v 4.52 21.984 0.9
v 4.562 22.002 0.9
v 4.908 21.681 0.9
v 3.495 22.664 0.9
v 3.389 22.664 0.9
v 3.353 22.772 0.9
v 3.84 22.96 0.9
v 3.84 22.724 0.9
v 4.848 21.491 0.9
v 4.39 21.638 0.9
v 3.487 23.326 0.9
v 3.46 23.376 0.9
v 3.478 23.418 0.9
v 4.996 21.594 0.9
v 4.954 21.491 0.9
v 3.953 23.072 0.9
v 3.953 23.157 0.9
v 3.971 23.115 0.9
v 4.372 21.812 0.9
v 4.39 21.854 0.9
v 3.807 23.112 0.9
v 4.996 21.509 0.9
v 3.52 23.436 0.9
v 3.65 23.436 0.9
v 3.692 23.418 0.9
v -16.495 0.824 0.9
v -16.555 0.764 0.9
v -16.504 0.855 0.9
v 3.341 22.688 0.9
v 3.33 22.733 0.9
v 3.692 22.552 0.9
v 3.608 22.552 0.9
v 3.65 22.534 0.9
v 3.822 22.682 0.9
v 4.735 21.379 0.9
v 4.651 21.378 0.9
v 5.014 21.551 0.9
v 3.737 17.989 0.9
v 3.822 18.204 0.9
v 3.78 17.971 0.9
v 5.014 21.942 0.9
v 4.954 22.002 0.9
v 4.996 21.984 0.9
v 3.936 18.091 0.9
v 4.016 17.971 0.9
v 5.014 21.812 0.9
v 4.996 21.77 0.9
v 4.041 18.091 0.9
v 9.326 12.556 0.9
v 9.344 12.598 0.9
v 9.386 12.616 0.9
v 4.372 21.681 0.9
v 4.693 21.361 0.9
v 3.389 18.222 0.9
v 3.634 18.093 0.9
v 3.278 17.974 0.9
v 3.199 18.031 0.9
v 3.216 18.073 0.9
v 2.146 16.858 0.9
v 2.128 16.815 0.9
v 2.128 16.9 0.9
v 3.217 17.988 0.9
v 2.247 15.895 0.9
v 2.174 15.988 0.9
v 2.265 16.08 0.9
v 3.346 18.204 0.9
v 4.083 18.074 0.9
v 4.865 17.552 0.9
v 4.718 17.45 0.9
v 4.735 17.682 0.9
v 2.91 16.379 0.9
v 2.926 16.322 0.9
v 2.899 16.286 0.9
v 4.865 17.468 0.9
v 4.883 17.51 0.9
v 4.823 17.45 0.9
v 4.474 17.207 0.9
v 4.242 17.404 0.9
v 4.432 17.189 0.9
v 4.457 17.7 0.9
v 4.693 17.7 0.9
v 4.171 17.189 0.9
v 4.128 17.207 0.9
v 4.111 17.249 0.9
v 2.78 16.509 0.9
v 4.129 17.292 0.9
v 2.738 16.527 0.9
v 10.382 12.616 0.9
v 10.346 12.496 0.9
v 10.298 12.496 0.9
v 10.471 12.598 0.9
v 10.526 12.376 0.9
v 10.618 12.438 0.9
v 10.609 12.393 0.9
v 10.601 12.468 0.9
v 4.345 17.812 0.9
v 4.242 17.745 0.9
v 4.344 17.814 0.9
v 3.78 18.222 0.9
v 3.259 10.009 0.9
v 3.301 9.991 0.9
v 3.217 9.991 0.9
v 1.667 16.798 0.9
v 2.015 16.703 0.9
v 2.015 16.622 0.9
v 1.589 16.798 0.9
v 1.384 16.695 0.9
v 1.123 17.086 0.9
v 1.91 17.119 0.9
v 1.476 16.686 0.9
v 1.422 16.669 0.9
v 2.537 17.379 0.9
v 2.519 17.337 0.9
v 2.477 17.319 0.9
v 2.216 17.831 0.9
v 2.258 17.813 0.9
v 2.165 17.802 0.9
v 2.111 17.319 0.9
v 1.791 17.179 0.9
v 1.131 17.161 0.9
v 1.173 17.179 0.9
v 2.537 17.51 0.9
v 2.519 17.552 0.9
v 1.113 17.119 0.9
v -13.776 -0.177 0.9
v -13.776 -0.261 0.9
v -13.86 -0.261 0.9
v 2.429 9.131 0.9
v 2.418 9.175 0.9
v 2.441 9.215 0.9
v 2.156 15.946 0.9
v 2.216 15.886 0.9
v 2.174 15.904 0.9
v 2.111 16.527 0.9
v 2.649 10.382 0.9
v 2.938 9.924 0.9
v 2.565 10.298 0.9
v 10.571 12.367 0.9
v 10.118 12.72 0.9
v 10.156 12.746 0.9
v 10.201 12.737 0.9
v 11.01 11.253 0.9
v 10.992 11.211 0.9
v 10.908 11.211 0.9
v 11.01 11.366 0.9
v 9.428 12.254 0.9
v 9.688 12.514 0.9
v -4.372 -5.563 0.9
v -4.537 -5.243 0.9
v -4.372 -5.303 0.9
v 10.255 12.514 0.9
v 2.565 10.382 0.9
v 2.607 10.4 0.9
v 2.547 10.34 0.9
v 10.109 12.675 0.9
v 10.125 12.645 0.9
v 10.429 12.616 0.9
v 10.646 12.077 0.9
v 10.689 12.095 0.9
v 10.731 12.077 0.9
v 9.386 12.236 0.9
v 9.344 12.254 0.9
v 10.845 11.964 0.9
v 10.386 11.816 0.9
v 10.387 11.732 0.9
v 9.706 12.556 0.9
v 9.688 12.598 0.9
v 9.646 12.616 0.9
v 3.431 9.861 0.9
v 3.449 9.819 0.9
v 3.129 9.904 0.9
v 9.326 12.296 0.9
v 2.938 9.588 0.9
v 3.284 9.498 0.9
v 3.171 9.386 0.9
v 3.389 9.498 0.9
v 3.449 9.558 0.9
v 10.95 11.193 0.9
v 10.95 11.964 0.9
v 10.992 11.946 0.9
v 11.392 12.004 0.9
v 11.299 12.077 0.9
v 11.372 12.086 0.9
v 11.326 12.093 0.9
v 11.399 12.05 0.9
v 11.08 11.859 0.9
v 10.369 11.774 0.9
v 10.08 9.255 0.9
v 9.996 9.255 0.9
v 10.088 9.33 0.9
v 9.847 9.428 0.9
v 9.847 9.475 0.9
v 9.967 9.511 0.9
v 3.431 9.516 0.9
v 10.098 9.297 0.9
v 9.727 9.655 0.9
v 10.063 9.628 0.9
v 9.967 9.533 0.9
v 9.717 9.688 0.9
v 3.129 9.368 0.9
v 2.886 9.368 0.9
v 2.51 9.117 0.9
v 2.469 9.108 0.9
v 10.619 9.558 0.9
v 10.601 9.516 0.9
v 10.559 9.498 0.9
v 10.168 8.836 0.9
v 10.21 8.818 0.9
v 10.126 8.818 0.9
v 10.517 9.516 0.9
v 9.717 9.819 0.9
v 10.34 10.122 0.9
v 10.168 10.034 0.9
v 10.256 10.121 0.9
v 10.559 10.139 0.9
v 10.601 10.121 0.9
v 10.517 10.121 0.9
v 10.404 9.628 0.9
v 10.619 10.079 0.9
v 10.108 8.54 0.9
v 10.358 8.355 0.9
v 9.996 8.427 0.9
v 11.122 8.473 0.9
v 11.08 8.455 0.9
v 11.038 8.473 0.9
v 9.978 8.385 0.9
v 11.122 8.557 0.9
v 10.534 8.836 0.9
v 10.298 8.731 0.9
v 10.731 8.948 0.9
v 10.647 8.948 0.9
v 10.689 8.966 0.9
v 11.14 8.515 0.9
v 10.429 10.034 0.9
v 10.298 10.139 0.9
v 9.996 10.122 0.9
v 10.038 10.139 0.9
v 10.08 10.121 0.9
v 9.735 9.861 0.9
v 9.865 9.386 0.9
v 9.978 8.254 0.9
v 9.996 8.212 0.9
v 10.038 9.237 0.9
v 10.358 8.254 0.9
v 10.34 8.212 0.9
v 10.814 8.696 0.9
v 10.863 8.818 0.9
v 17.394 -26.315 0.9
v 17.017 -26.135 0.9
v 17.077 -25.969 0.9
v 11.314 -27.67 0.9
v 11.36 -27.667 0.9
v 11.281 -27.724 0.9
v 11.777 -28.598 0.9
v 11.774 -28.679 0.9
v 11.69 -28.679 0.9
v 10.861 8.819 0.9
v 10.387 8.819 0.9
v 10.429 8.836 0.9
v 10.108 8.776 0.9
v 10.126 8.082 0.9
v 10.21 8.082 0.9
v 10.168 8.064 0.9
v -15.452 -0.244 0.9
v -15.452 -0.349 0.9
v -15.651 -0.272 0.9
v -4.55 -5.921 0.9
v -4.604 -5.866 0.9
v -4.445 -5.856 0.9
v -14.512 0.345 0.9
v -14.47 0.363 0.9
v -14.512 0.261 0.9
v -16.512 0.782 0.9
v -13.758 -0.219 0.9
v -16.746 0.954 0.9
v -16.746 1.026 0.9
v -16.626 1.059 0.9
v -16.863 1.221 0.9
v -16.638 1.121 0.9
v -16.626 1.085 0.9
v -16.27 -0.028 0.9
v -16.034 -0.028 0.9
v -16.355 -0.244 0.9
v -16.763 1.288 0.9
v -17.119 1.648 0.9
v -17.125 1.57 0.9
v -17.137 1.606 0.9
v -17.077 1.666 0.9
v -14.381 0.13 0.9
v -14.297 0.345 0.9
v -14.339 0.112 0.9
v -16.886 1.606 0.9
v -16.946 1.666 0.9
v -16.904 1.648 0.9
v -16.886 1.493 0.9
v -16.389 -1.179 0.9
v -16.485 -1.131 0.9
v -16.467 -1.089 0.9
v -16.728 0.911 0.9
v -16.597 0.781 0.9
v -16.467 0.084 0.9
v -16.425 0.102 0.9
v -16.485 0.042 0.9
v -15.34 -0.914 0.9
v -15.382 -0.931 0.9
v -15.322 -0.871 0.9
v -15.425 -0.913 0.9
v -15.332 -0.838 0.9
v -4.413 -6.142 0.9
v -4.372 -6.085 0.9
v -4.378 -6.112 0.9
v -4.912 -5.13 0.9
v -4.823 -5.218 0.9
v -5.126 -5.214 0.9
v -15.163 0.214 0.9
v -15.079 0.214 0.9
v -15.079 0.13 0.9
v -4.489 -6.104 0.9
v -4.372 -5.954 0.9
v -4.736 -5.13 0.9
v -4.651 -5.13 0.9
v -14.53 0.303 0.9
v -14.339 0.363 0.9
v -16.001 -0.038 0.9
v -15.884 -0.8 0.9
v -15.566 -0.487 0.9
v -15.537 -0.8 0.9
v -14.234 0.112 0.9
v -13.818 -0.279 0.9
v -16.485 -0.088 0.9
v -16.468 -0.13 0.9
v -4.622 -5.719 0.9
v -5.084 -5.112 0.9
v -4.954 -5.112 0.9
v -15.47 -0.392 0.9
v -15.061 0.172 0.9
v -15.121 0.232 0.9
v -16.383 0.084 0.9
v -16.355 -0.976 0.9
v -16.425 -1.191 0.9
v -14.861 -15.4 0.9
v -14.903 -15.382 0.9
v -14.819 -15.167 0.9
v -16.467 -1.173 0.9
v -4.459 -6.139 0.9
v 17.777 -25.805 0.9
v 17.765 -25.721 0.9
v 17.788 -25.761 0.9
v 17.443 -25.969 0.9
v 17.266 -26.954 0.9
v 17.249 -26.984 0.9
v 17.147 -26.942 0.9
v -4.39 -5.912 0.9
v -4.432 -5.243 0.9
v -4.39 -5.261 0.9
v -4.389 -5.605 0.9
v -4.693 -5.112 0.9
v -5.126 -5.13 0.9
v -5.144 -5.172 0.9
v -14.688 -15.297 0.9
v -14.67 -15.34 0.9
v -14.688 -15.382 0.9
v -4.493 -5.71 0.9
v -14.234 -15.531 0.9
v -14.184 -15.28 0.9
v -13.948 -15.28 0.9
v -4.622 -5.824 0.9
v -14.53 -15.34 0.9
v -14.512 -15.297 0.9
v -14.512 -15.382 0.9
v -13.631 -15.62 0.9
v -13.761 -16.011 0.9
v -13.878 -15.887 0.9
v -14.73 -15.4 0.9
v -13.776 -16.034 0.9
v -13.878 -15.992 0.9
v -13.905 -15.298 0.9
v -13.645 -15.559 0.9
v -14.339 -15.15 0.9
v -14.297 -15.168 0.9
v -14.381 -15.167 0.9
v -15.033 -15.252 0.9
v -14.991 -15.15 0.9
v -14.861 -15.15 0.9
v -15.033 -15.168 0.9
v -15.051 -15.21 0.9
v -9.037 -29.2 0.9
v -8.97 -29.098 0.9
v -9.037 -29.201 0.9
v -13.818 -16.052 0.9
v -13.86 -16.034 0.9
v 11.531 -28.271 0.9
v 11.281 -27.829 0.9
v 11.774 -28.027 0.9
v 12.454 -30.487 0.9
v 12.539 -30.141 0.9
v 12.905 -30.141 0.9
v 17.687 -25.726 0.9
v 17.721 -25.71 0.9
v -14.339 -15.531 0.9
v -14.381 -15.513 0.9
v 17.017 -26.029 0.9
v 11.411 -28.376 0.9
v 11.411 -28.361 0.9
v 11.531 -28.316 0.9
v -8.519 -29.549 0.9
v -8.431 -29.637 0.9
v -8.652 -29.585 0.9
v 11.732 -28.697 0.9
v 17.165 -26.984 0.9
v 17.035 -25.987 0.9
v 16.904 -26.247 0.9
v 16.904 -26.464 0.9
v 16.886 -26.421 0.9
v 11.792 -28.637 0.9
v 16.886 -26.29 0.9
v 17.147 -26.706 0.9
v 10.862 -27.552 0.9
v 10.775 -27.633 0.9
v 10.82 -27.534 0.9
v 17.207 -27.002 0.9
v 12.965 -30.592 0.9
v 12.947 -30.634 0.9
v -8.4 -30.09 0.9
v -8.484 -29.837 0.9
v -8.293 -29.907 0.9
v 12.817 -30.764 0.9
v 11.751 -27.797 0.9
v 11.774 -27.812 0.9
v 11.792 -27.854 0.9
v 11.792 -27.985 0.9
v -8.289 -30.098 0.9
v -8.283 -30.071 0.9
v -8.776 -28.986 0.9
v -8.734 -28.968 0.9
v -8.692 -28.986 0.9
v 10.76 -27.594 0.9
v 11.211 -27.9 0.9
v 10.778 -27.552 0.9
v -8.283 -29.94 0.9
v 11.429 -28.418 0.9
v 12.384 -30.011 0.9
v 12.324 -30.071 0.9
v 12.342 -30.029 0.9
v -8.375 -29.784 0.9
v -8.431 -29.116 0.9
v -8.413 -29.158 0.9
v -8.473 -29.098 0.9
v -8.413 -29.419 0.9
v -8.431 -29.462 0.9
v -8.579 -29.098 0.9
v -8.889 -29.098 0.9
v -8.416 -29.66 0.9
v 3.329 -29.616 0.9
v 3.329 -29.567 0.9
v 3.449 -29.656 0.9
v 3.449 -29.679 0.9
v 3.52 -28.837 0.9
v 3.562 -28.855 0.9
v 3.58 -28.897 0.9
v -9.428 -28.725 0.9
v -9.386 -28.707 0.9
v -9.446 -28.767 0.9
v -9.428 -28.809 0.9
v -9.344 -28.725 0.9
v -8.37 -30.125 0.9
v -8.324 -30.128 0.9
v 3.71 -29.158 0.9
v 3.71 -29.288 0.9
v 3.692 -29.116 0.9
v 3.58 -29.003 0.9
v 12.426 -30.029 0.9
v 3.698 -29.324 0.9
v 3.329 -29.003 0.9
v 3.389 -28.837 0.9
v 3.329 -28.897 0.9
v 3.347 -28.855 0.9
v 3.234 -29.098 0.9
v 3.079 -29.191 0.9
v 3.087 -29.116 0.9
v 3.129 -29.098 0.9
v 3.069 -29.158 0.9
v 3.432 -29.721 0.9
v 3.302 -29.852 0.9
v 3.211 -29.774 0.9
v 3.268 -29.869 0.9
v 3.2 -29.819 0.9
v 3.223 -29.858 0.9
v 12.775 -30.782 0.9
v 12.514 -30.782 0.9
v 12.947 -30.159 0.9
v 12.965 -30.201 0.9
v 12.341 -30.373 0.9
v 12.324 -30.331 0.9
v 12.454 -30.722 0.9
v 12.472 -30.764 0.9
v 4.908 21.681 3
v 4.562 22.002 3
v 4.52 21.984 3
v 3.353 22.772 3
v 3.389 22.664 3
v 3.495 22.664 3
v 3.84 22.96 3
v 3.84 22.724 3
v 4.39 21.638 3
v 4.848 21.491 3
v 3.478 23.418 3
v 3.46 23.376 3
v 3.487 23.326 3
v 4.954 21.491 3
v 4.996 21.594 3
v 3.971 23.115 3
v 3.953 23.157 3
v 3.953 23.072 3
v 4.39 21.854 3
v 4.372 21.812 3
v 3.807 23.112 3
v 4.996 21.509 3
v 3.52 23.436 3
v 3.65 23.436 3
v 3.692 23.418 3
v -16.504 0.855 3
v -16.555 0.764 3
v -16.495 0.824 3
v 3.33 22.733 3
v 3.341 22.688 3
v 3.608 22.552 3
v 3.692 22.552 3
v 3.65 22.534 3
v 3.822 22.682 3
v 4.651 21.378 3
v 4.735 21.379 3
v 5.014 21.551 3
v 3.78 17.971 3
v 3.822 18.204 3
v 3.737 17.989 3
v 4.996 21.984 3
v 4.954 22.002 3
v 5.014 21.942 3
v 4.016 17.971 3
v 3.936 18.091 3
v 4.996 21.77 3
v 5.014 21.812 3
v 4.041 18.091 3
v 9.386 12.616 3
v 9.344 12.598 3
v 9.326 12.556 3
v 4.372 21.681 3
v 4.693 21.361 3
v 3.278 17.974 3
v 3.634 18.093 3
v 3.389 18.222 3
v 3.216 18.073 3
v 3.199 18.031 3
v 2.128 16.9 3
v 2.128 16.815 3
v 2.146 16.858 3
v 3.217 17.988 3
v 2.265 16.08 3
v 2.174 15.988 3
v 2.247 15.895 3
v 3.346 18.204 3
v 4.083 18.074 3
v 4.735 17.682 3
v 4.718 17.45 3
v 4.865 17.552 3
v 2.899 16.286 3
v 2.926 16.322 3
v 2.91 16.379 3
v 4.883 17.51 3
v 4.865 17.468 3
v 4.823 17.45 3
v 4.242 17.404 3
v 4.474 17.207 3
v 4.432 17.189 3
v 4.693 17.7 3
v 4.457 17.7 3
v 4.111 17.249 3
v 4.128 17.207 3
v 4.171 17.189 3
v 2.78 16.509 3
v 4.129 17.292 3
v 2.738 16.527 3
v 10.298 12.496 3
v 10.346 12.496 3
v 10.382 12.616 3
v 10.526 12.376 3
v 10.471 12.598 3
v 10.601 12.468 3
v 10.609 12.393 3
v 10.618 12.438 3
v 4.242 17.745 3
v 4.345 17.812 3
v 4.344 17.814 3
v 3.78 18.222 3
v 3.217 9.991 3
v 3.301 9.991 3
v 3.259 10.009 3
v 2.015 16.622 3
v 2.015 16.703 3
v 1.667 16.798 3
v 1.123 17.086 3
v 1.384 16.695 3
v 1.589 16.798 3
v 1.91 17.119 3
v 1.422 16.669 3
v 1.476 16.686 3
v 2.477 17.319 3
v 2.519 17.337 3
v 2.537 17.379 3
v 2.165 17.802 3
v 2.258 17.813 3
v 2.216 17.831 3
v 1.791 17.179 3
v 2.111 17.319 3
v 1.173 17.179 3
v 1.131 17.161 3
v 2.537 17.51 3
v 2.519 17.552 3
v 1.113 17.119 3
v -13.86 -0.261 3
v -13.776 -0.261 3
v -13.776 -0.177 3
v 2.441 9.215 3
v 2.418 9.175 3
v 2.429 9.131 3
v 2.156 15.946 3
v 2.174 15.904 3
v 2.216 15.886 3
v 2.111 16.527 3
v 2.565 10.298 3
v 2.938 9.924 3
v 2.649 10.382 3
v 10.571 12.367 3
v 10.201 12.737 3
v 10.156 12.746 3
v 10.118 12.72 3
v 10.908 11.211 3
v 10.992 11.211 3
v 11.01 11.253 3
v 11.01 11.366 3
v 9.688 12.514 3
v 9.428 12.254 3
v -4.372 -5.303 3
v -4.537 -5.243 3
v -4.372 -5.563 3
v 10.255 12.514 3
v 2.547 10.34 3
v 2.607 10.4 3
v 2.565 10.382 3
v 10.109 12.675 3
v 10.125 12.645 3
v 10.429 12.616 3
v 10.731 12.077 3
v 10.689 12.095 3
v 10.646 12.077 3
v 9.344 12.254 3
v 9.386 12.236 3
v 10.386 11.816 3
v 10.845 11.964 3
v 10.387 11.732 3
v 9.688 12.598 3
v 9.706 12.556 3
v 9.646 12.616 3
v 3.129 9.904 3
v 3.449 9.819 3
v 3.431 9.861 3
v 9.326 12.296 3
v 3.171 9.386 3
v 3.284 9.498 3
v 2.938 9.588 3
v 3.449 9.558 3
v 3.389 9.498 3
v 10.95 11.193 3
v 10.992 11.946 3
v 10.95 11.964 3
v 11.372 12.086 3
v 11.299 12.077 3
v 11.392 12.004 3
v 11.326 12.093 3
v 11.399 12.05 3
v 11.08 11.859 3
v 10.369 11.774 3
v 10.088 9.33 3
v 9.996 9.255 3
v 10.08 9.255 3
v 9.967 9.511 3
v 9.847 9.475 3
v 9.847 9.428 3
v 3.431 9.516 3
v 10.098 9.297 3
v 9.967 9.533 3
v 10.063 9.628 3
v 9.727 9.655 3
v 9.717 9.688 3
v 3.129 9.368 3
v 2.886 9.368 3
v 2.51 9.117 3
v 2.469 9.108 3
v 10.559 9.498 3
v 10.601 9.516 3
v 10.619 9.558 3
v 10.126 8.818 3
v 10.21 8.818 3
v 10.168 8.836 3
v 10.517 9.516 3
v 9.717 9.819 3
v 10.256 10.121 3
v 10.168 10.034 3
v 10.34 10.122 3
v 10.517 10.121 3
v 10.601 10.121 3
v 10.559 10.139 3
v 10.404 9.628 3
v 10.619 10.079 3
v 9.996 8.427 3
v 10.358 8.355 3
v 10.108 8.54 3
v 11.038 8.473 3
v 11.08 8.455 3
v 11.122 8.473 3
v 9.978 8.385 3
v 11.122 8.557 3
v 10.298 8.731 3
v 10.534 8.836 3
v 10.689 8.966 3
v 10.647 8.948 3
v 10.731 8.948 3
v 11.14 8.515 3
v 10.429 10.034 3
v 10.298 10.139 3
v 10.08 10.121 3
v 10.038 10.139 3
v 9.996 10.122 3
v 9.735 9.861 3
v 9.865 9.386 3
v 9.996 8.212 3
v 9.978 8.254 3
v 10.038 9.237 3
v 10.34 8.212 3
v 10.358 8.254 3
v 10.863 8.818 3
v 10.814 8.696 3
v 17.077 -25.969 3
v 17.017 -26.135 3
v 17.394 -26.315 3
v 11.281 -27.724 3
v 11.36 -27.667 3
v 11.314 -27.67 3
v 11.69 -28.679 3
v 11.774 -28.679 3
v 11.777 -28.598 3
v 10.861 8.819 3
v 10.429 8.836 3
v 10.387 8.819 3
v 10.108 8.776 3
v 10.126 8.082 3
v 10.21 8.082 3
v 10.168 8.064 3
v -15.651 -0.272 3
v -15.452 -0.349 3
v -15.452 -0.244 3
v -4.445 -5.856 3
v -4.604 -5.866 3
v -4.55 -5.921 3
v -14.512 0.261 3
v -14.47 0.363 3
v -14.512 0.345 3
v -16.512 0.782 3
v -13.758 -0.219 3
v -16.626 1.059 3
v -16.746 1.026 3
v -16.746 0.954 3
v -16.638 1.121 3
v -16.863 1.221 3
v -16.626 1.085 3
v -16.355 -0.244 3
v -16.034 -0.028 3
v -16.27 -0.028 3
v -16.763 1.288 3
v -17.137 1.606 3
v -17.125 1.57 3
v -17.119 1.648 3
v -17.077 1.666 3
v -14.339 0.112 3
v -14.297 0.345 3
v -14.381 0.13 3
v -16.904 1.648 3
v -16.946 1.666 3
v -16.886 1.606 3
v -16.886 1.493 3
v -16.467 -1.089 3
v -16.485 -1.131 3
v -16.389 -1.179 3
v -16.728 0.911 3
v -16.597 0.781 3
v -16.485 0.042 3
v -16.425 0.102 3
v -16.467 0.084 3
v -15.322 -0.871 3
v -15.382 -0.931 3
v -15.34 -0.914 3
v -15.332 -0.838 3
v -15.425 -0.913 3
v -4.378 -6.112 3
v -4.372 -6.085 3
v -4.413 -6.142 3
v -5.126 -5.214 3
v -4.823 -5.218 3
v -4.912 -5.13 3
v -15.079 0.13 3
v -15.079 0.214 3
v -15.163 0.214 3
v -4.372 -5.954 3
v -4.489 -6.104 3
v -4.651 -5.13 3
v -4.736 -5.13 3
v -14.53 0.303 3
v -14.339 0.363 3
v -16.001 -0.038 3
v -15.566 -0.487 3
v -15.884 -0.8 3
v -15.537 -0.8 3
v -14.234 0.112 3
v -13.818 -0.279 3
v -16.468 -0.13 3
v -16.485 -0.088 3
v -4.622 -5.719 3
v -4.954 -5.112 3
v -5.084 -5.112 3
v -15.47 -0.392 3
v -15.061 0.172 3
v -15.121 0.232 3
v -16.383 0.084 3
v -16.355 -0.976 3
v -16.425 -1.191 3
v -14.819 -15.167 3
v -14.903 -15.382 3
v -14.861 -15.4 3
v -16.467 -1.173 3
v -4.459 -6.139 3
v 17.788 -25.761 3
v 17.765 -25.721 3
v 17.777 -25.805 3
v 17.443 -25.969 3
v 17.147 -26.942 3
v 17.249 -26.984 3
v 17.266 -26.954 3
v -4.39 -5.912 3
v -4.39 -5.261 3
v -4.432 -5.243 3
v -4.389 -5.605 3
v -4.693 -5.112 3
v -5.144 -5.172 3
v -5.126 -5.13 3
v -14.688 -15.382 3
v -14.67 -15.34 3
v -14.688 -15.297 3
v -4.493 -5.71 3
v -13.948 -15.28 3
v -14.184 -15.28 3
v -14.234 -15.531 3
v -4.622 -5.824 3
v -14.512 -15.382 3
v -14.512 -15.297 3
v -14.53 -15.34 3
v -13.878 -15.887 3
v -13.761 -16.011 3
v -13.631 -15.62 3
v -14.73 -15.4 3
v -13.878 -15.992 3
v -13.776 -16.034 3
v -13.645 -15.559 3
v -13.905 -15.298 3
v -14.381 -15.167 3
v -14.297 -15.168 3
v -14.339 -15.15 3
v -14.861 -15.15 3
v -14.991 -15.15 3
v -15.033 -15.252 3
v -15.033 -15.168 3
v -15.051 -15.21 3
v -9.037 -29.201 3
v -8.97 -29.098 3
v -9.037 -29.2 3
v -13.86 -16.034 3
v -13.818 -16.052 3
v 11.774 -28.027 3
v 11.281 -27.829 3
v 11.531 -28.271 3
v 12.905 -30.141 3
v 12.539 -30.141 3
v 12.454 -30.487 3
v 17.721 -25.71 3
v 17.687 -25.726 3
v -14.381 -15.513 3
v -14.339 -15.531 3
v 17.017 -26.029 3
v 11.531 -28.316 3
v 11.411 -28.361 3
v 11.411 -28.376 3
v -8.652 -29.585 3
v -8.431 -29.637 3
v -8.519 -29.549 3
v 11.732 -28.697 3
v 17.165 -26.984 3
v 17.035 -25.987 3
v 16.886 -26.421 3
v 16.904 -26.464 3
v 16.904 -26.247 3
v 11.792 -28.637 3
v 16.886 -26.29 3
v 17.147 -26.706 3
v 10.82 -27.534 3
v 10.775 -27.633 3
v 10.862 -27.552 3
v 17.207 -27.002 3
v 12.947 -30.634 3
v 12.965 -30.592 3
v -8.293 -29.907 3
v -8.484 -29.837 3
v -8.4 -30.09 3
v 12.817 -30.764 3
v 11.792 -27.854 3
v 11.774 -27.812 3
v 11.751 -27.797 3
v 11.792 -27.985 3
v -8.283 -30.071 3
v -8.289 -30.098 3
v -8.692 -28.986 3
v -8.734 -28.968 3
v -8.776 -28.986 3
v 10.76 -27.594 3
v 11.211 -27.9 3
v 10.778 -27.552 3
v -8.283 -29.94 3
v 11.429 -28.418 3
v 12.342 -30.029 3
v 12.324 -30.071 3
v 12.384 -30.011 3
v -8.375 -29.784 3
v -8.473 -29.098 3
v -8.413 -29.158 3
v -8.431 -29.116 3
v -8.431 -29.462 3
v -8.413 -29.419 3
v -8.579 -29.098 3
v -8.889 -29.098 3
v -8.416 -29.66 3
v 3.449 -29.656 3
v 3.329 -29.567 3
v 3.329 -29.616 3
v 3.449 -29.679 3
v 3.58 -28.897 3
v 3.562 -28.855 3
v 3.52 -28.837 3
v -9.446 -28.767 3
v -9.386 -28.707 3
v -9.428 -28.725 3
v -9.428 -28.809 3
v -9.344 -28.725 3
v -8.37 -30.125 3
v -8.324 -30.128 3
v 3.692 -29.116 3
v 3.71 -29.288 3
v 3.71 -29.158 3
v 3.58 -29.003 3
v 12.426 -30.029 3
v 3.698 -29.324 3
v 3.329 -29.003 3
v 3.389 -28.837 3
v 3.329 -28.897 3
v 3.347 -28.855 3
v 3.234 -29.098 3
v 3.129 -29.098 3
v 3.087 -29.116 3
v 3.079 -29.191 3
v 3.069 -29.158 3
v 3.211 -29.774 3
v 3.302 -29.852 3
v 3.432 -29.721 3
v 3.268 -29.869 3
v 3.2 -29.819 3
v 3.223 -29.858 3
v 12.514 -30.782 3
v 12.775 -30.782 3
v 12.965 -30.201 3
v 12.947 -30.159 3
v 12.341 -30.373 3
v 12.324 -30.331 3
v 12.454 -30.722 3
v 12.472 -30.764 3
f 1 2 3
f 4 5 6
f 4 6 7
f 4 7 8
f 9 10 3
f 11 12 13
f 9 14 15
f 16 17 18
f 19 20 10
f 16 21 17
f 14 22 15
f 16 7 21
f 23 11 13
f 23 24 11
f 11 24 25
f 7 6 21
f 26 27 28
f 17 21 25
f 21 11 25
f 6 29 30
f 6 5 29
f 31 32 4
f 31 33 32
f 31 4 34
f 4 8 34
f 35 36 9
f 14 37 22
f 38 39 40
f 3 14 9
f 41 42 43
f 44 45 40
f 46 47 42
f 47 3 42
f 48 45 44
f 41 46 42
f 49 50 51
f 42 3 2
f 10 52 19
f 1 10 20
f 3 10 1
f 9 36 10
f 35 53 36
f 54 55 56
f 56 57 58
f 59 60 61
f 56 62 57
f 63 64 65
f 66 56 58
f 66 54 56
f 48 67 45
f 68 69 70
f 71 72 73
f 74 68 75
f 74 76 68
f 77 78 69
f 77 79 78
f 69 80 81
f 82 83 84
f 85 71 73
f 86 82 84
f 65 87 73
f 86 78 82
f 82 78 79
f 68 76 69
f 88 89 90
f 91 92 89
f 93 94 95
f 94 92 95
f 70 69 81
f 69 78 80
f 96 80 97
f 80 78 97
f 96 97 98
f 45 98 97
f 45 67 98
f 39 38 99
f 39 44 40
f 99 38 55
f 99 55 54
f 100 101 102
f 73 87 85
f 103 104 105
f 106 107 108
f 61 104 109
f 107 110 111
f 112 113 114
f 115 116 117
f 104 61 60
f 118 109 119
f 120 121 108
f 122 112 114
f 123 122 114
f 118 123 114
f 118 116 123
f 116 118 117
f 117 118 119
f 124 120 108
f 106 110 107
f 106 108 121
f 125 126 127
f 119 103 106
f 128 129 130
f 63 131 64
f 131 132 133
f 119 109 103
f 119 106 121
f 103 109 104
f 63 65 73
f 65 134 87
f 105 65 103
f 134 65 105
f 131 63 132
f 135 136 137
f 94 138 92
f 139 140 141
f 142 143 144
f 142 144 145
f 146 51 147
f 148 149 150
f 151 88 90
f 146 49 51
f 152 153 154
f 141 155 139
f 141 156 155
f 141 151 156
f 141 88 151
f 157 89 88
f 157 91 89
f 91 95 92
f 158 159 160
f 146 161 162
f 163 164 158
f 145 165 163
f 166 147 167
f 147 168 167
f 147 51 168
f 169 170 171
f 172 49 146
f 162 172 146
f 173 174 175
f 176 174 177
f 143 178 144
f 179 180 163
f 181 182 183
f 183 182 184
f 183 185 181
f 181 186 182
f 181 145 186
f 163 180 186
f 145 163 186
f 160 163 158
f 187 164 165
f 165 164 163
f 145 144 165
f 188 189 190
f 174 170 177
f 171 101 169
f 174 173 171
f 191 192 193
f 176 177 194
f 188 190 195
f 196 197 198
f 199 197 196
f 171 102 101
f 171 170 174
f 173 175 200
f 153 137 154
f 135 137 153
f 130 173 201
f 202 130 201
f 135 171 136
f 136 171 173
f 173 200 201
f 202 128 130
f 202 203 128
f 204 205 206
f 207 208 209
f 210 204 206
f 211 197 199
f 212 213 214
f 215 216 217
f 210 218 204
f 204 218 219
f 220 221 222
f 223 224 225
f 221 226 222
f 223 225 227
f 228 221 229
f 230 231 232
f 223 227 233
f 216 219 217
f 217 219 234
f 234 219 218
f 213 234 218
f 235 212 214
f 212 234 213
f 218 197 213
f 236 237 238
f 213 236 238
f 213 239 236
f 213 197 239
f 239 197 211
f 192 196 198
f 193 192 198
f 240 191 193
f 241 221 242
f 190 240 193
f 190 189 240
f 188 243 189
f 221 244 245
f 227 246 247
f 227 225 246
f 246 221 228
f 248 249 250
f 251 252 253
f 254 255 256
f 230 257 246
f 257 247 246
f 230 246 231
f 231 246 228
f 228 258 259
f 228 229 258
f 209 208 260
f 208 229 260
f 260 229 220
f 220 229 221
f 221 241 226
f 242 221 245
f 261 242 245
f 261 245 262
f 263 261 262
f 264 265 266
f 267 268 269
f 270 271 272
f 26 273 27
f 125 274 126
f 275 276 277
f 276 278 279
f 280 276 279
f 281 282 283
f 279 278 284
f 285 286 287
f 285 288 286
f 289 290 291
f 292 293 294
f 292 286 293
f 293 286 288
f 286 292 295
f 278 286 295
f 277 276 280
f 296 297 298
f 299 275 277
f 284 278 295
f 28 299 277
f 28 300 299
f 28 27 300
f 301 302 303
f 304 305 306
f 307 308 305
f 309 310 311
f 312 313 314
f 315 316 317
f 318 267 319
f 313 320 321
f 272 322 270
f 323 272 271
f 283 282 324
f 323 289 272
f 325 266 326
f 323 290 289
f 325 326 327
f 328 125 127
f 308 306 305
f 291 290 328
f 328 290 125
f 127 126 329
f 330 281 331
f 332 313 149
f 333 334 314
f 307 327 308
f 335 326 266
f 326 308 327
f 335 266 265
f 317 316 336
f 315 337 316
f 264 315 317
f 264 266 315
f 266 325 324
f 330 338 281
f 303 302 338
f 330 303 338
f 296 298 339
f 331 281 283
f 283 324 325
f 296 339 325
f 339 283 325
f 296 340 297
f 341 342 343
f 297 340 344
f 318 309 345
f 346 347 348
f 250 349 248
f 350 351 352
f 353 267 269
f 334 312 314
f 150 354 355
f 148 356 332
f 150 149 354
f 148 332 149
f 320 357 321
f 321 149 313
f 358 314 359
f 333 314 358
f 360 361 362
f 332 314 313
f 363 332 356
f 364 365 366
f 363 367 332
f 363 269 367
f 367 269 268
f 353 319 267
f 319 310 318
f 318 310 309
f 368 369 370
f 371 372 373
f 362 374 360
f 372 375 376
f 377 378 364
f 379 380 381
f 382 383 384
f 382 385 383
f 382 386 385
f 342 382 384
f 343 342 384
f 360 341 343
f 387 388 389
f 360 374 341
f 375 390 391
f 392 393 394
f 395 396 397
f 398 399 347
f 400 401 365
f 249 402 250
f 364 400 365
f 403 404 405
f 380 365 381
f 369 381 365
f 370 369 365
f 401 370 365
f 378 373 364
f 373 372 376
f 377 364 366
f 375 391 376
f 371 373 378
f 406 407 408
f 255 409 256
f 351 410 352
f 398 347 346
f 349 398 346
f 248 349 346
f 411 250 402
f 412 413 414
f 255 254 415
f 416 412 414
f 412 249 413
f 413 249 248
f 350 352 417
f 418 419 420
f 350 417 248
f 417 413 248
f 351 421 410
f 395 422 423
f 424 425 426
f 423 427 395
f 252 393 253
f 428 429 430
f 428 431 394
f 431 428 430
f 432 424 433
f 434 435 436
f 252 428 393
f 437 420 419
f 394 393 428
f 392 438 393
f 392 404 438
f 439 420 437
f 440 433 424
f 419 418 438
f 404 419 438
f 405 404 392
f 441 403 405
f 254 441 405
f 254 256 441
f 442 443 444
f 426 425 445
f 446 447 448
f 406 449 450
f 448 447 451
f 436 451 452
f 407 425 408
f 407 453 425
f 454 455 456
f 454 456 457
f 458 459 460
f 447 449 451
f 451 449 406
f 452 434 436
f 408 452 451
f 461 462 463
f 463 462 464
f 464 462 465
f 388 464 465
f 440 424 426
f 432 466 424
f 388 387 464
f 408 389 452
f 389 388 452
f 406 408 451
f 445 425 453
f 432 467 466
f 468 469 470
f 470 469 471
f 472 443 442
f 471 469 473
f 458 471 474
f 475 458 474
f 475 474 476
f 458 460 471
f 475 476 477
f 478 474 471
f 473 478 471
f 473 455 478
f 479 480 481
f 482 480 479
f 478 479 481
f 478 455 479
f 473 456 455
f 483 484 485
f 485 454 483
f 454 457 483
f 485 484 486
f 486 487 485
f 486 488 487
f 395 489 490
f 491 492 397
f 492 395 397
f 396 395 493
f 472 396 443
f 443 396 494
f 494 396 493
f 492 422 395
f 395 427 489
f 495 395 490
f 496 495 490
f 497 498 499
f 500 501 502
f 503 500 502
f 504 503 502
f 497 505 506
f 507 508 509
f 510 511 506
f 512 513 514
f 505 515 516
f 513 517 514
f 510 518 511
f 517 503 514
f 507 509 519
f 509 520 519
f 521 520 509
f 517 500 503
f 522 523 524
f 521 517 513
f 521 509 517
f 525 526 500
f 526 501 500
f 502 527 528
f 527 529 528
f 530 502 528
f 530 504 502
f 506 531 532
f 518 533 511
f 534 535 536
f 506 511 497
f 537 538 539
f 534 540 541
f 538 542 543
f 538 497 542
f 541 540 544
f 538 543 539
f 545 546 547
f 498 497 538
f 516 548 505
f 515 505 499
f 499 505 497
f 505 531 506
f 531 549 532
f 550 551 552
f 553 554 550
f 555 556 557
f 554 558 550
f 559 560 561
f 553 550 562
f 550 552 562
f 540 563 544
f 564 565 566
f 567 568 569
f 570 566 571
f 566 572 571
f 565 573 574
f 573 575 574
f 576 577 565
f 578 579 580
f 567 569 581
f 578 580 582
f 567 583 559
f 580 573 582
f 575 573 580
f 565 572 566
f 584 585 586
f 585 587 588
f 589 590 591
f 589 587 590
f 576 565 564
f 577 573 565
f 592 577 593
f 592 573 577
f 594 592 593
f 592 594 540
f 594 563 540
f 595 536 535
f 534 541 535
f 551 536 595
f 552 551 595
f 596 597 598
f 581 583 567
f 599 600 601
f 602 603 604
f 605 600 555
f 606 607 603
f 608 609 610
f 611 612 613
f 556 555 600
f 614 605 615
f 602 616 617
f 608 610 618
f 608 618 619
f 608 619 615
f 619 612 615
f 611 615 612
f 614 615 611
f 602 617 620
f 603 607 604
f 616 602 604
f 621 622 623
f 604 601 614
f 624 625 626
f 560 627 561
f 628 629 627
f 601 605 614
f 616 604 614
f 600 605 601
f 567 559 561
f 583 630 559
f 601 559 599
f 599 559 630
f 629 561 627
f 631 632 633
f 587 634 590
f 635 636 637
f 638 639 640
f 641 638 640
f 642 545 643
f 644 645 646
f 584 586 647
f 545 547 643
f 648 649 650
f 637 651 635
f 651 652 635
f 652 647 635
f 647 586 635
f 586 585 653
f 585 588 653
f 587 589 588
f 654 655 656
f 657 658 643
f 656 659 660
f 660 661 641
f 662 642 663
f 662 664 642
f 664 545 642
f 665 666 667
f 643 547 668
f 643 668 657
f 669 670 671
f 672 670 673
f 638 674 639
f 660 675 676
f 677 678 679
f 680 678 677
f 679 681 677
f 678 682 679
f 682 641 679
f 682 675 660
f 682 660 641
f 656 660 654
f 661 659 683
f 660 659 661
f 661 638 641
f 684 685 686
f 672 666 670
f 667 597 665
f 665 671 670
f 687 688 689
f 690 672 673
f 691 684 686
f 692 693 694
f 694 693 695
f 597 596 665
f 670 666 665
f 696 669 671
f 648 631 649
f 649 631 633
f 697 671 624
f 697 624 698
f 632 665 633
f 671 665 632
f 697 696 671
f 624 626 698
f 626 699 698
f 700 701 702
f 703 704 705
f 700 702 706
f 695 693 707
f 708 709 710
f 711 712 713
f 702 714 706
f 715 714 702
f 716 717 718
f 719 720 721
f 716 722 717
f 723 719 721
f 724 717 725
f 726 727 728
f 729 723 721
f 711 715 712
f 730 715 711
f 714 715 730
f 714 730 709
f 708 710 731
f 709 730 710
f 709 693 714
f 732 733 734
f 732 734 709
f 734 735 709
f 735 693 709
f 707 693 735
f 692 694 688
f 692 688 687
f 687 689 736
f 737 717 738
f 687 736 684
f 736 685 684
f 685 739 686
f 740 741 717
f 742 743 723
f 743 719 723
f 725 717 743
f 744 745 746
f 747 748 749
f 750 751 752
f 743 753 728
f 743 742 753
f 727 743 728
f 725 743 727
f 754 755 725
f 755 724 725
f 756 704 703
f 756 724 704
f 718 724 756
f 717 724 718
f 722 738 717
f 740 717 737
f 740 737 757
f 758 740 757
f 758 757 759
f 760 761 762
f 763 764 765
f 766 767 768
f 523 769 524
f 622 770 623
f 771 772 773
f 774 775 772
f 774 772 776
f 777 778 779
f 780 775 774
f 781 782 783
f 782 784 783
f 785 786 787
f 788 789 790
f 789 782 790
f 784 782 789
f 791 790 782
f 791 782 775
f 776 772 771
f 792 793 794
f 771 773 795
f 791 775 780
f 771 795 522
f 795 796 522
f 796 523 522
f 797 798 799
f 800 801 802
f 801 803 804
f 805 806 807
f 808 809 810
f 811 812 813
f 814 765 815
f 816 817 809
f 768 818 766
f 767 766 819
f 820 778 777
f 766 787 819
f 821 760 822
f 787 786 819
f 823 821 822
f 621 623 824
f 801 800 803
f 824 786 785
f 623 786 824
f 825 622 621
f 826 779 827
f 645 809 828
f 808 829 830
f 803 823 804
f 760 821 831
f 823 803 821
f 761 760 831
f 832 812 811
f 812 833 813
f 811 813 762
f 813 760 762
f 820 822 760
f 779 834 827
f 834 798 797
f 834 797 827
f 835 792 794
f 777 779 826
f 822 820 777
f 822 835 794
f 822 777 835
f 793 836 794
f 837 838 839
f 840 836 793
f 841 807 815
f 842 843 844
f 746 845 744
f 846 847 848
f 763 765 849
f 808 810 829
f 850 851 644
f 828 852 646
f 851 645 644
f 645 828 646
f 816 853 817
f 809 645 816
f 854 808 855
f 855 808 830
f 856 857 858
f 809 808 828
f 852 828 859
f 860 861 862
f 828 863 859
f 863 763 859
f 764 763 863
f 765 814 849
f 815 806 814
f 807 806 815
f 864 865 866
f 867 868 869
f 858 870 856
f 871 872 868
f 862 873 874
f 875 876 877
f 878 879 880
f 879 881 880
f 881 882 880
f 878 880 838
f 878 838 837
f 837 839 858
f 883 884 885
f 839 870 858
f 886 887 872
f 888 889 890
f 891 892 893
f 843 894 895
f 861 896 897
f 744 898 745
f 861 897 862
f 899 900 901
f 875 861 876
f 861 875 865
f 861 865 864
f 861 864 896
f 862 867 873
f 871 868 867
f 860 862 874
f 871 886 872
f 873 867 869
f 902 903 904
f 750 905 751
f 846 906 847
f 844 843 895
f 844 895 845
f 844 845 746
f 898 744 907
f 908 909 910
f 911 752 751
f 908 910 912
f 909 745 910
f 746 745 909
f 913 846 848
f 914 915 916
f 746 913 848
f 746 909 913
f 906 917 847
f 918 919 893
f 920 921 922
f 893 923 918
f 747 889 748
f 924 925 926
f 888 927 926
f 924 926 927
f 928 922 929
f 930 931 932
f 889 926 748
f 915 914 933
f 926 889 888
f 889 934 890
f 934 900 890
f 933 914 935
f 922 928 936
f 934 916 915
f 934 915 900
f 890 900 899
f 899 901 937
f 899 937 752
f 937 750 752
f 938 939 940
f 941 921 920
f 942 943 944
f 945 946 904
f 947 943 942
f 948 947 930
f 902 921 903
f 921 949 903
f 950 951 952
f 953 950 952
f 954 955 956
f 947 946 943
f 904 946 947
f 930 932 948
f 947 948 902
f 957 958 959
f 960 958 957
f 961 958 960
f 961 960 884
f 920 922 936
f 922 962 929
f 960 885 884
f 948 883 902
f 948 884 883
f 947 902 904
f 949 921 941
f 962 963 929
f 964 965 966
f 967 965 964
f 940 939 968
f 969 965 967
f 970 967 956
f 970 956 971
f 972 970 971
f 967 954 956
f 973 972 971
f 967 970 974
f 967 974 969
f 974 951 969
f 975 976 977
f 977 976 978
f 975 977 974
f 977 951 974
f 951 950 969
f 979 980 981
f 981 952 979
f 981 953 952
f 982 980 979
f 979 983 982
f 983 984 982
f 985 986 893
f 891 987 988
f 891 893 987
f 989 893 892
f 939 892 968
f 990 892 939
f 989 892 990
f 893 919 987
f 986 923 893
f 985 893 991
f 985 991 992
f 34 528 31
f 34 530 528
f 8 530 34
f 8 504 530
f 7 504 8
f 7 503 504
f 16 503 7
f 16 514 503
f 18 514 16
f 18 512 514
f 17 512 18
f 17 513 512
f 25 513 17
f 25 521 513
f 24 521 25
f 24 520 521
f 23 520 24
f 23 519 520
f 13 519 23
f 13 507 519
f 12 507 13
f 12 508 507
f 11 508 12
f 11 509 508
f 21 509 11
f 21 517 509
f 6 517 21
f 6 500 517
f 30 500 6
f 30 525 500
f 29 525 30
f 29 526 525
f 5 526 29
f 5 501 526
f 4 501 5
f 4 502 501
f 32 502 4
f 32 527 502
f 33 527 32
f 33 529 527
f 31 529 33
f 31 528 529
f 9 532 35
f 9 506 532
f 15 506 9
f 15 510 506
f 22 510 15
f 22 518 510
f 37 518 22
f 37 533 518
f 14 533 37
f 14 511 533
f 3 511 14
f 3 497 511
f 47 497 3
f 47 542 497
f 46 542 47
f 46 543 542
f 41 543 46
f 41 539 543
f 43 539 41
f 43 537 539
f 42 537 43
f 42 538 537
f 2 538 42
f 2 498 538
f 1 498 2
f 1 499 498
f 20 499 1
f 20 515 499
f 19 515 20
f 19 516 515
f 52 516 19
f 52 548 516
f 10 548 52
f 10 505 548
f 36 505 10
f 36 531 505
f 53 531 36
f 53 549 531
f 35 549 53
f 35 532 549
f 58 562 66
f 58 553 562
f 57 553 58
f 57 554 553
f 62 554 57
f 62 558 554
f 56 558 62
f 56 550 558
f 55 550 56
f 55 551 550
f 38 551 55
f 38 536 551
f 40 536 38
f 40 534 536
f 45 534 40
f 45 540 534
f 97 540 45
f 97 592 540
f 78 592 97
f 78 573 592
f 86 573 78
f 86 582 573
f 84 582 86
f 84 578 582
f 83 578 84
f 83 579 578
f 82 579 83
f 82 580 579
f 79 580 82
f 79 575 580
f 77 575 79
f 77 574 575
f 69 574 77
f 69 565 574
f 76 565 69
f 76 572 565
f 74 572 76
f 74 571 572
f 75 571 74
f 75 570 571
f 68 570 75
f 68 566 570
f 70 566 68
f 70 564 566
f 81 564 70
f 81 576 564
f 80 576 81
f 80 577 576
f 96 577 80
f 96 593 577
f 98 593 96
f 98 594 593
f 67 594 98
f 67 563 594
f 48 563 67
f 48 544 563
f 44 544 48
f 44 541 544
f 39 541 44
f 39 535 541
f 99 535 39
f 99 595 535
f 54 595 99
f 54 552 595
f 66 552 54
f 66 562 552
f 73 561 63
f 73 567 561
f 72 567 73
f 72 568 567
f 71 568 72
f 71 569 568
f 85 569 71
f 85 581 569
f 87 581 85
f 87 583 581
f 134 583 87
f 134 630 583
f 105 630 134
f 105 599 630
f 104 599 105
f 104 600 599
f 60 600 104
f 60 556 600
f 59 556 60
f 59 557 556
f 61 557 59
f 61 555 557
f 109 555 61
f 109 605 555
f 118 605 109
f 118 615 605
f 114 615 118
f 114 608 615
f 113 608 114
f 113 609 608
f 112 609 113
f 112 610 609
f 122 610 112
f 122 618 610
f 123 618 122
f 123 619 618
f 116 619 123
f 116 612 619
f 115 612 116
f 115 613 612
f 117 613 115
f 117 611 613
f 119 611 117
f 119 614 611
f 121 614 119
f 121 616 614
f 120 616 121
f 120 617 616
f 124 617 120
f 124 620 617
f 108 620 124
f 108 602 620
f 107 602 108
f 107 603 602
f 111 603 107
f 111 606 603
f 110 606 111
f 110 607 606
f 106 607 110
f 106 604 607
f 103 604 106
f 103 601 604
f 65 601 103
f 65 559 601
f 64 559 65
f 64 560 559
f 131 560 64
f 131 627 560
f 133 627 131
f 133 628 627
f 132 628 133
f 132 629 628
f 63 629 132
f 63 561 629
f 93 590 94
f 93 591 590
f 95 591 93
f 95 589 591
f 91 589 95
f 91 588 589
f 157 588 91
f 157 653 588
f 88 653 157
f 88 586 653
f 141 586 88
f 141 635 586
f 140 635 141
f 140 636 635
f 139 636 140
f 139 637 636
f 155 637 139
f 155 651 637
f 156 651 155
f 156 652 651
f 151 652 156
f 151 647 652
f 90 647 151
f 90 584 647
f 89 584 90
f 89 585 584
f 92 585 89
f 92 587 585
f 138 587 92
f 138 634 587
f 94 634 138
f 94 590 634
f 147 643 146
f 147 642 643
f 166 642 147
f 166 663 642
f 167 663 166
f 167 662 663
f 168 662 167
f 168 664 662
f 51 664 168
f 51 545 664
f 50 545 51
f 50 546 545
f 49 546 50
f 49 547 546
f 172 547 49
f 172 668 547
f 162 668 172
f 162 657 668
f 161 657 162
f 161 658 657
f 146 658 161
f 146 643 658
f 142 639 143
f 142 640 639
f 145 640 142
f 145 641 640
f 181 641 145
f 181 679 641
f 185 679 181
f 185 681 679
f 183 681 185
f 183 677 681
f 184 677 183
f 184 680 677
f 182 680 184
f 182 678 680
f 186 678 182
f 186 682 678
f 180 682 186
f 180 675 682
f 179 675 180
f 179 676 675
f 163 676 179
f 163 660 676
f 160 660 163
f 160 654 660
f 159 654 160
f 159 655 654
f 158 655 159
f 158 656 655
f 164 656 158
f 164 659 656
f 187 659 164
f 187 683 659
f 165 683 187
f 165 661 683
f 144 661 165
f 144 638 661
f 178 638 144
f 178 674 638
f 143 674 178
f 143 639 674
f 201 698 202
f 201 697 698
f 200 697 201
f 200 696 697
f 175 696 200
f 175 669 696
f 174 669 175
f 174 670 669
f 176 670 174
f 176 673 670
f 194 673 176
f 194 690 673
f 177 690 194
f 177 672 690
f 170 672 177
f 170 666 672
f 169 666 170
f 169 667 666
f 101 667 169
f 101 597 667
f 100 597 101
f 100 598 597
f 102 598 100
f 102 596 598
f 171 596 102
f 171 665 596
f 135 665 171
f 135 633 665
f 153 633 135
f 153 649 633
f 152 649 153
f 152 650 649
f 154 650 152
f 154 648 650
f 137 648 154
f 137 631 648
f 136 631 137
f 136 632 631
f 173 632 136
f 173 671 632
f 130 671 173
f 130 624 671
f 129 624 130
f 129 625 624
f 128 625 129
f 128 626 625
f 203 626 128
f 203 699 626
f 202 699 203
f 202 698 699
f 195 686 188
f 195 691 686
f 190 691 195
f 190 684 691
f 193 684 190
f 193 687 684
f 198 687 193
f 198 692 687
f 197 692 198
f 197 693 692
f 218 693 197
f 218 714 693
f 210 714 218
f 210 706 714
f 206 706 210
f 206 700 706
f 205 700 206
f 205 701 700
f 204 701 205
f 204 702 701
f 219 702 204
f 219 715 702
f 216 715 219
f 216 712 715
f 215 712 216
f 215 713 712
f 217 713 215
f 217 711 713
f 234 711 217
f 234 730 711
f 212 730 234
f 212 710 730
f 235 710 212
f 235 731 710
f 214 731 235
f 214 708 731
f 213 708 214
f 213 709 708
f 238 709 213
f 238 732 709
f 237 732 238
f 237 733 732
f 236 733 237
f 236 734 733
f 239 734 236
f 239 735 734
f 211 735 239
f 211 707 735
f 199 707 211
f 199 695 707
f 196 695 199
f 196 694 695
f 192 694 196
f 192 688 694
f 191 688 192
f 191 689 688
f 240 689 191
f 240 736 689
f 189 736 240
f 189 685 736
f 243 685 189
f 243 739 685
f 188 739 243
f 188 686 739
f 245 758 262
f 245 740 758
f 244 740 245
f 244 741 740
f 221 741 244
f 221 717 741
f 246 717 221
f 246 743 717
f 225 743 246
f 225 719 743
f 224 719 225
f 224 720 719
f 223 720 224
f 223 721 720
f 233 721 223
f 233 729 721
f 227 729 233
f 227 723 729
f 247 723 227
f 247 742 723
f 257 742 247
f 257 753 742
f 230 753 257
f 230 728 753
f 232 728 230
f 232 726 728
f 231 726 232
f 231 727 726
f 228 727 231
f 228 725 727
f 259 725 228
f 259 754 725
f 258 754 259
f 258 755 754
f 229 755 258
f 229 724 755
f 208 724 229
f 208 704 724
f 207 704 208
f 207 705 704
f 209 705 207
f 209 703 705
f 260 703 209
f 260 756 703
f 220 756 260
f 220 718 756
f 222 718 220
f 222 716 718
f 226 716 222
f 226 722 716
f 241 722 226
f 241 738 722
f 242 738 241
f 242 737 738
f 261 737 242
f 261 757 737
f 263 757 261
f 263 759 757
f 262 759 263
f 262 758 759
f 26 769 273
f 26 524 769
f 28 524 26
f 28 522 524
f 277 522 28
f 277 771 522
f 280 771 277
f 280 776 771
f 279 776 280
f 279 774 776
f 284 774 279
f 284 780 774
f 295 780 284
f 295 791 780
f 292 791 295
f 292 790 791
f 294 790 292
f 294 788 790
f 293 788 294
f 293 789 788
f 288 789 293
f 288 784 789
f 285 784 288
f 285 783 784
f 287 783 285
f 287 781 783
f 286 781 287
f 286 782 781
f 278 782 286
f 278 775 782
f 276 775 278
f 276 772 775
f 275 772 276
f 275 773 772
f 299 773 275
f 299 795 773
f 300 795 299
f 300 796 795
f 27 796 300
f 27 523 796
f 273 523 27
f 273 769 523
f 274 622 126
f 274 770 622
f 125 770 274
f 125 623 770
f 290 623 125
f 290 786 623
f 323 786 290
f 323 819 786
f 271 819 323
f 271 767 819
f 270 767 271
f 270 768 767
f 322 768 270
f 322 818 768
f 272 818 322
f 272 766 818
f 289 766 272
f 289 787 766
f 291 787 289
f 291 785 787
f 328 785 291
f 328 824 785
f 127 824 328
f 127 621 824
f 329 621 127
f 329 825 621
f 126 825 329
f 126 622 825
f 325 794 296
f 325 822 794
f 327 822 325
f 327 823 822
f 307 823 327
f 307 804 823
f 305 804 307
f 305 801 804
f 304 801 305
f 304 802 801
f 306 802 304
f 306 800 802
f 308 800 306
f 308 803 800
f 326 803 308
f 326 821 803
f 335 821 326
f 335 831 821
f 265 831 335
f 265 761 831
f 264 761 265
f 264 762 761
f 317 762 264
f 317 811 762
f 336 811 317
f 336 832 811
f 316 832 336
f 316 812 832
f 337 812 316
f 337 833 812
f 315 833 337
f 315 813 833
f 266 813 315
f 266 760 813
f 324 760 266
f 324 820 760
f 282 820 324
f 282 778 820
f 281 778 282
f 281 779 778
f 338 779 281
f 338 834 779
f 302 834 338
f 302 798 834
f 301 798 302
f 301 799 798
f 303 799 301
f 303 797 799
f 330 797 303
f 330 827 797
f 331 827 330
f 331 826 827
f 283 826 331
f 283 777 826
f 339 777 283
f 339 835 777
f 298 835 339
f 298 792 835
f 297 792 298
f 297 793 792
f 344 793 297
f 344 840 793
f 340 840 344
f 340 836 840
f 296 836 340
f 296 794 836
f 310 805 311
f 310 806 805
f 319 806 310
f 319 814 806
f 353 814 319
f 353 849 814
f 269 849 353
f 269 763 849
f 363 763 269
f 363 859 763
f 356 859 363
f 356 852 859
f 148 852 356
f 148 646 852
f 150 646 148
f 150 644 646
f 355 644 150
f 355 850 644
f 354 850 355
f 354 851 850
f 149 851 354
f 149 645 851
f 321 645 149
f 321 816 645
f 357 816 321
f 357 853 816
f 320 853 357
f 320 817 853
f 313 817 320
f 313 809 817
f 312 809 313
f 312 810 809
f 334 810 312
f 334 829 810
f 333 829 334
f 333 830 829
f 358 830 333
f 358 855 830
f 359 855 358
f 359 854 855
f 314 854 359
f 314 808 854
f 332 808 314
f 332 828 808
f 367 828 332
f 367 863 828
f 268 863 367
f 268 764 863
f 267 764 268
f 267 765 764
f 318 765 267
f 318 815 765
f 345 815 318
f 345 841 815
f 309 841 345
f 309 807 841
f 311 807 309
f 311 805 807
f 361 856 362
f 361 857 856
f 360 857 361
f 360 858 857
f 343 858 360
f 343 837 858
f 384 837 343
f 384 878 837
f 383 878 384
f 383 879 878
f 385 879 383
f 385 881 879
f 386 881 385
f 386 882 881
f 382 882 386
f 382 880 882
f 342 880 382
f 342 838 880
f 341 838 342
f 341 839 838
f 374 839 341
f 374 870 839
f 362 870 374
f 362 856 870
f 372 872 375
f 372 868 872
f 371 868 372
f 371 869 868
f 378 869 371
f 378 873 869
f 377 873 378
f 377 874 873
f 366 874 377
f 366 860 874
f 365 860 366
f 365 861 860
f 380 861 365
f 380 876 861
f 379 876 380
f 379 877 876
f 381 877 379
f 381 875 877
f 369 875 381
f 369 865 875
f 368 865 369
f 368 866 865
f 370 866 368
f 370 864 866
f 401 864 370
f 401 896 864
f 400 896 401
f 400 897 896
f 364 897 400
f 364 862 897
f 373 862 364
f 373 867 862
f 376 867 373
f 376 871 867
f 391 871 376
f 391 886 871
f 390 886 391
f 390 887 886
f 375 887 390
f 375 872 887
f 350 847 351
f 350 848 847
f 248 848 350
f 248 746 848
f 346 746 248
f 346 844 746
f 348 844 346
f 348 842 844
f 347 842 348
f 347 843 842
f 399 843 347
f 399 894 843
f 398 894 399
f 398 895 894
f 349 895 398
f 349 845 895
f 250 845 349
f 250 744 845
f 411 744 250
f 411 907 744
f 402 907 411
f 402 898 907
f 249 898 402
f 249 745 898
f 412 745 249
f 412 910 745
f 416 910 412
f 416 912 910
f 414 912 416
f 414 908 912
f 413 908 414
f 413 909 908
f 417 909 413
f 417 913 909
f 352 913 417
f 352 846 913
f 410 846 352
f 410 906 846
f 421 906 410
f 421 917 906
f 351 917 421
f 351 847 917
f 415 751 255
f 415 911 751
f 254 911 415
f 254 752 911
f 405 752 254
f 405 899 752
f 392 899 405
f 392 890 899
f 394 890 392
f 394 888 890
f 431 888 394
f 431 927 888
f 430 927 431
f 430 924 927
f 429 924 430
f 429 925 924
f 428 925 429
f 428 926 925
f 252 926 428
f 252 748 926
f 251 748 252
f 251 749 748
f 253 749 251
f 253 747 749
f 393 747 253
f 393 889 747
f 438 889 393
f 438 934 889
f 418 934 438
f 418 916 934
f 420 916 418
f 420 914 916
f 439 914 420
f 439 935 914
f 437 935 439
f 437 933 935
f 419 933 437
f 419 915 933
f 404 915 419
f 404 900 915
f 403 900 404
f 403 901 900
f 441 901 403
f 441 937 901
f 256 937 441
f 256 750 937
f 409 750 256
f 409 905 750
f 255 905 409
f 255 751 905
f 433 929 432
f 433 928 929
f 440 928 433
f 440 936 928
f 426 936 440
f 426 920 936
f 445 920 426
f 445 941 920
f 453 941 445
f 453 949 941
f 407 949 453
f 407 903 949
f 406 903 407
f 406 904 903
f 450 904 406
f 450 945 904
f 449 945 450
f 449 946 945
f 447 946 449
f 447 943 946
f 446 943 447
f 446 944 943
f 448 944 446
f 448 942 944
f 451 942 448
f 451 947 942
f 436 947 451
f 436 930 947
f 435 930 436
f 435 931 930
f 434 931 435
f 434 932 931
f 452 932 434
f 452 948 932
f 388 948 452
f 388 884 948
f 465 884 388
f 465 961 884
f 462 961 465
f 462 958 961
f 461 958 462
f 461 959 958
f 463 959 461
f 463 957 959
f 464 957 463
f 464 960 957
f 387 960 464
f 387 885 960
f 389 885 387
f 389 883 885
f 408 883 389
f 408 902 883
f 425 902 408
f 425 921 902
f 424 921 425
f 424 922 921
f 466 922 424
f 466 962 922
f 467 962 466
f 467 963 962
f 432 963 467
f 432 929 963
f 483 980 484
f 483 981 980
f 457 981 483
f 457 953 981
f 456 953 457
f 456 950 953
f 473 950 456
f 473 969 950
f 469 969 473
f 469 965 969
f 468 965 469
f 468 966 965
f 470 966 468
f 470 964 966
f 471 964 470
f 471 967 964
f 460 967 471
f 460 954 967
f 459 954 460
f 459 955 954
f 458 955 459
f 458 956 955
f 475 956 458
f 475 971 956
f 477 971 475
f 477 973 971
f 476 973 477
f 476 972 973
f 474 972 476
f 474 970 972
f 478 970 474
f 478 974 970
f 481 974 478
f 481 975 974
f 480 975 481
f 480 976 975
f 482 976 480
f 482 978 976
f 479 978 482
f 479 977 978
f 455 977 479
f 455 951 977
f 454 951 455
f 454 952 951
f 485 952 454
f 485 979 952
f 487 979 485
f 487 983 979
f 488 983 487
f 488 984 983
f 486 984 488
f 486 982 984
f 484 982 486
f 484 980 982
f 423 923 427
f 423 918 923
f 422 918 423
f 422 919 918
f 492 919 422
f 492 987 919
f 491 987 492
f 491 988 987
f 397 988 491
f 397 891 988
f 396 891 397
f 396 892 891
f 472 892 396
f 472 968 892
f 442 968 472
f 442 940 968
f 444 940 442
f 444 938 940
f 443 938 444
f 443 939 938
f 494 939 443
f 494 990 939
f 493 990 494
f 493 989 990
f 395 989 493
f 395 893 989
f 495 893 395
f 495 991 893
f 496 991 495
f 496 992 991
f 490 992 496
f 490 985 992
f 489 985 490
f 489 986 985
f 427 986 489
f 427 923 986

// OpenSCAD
$fn = 24;
translate([0, -2.500, 0.900])
  linear_extrude(height=2.100) {
offset(r=0.06, $fn=8) {
    polygon(points=[[12.384,-27.440],[12.384,-27.831],[12.514,-27.962],[12.514,-28.222],[12.384,-28.353],[12.384,-28.483],[12.384,-28.353],[12.514,-28.222],[12.775,-28.222],[12.905,-28.092],[12.905,-27.701],[12.514,-27.701],[12.384,-27.571]], paths=[[0,1,2,3,4,5,6,7,8,9,10,11,12]]);
    polygon(points=[[-9.386,-26.267],[-8.473,-27.179],[-8.343,-27.571],[-8.343,-27.440],[-8.604,-27.049],[-8.473,-26.919],[-8.473,-26.658],[-8.604,-26.658],[-8.734,-26.528],[-8.864,-26.658],[-8.995,-26.658]], paths=[[0,1,2,3,4,5,6,7,8,9,10]]);
    polygon(points=[[10.820,-25.094],[11.732,-26.137],[11.471,-25.876],[11.471,-25.746],[11.732,-25.485],[11.732,-25.354],[11.341,-25.224],[11.341,-25.354],[11.211,-25.485]], paths=[[0,1,2,3,4,5,6,7,8]]);
    polygon(points=[[5.475,-25.094],[4.954,-25.485],[4.823,-25.485],[3.650,-26.658],[3.520,-26.528],[3.520,-26.397],[3.389,-26.397],[3.389,-26.528],[3.259,-26.658],[3.129,-26.658],[3.389,-27.049],[3.389,-27.179],[3.259,-27.310],[3.650,-26.788],[3.650,-26.658],[4.823,-25.485],[4.954,-25.485]], paths=[[0,1,2,3,4,5,6,7,8,9,10,11,12,13,14,15,16]]);
    polygon(points=[[17.729,-23.269],[17.468,-23.529],[17.077,-23.529],[17.077,-23.660],[16.946,-23.790],[16.946,-23.921],[17.207,-24.181],[17.207,-24.442],[17.338,-23.790]], paths=[[0,1,2,3,4,5,6,7,8]]);
    polygon(points=[[-14.991,-12.710],[-14.861,-12.840],[-14.470,-12.840],[-14.339,-12.971],[-14.209,-12.971],[-13.818,-13.362],[-13.818,-13.492],[-13.688,-13.101],[-13.948,-12.840],[-14.209,-12.840],[-14.339,-12.710],[-14.470,-12.840],[-14.730,-12.840],[-14.861,-12.710]], paths=[[0,1,2,3,4,5,6,7,8,9,10,11,12,13]]);
    polygon(points=[[-5.084,-2.672],[-4.562,-3.194],[-4.432,-3.585],[-4.432,-3.454],[-4.562,-3.324],[-4.562,-3.194],[-4.432,-3.063],[-4.432,-2.803],[-4.562,-2.803],[-4.693,-2.672],[-4.823,-2.803],[-4.954,-2.672]], paths=[[0,1,2,3,4,5,6,7,8,9,10,11]]);
    polygon(points=[[-17.077,4.106],[-16.686,3.585],[-16.686,3.454],[-16.555,3.324],[-16.555,3.063],[-16.425,2.933],[-16.425,2.412],[-16.295,2.281],[-16.295,1.499],[-16.425,1.369],[-16.425,1.238],[-16.425,1.369],[-15.904,1.760],[-15.512,1.760],[-15.382,1.629],[-15.643,2.021],[-15.512,2.151],[-15.512,2.281],[-15.121,2.672],[-14.991,2.672],[-14.861,2.803],[-14.470,2.803],[-14.339,2.672],[-14.209,2.672],[-13.818,2.281],[-13.818,2.151],[-13.818,2.281],[-14.339,2.803],[-14.861,2.803],[-14.991,2.672],[-15.121,2.672],[-15.643,2.151],[-16.034,2.412],[-16.295,2.412],[-16.425,2.542],[-16.425,2.933],[-16.555,3.063],[-16.555,3.324],[-16.946,3.976],[-16.946,4.106],[-16.816,4.237],[-16.946,4.106]], paths=[[0,1,2,3,4,5,6,7,8,9,10,11,12,13,14,15,16,17,18,19,20,21,22,23,24,25,26,27,28,29,30,31,32,33,34,35,36,37,38,39,40,41]]);
    polygon(points=[[11.080,11.015],[10.689,11.406],[10.689,11.537],[10.689,11.406],[10.559,11.276],[10.429,11.276],[10.298,11.146],[10.168,11.276],[10.168,11.015],[10.038,10.885],[10.038,10.754],[9.646,10.363],[9.255,10.233],[9.646,10.363],[10.038,10.754],[10.168,10.624],[10.298,10.754],[10.298,10.885],[10.820,11.276]], paths=[[0,1,2,3,4,5,6,7,8,9,10,11,12,13,14,15,16,17,18]]);
    polygon(points=[[9.386,12.710],[9.777,12.319],[9.777,12.188],[10.038,11.797],[9.907,11.928],[9.907,12.058],[10.038,12.188],[10.429,12.188],[10.559,12.058],[10.559,11.797],[10.559,12.710],[10.559,12.579],[10.429,12.449],[10.298,12.579],[10.168,12.449],[10.038,12.579],[9.777,12.319]], paths=[[0,1,2,3,4,5,6,7,8,9,10,11,12,13,14,15,16]]);
    polygon(points=[[1.304,12.319],[1.304,12.188],[1.434,12.058],[1.304,12.188],[1.304,12.319],[1.825,12.840],[2.607,12.840],[2.998,12.449],[2.998,12.058],[2.477,11.667],[1.955,11.667],[2.477,11.667],[2.868,11.928],[3.129,11.928],[3.259,12.058],[3.389,12.058],[3.389,12.319],[3.259,12.449],[3.129,12.319],[2.607,12.840],[1.825,12.840]], paths=[[0,1,2,3,4,5,6,7,8,9,10,11,12,13,14,15,16,17,18,19,20]]);
    polygon(points=[[9.386,15.056],[9.386,14.796],[9.777,15.187],[10.168,15.187],[10.298,15.056],[10.429,15.056],[10.689,14.796],[10.689,14.535],[10.429,14.274],[10.950,13.753],[10.950,13.622],[10.950,13.883],[11.341,14.535],[11.080,14.274],[10.950,14.404],[10.820,14.404],[10.689,14.535],[10.689,14.796],[10.559,14.926],[10.689,15.056],[10.559,14.926],[10.168,15.187],[9.777,15.187],[9.646,15.056]], paths=[[0,1,2,3,4,5,6,7,8,9,10,11,12,13,14,15,16,17,18,19,20,21,22,23]]);
    polygon(points=[[2.216,20.271],[1.825,19.619],[0.913,19.619],[1.173,19.619],[1.434,19.228],[1.564,19.358],[1.695,19.358],[2.346,18.576],[2.216,18.446],[2.868,18.837],[3.129,18.837],[2.868,18.837],[2.738,18.967],[2.086,18.967],[1.955,19.097],[1.955,19.228],[2.086,19.358],[1.825,19.619],[2.086,19.879],[2.477,19.879],[2.477,20.010]], paths=[[0,1,2,3,4,5,6,7,8,9,10,11,12,13,14,15,16,17,18,19,20]]);
    polygon(points=[[3.259,20.531],[3.650,20.662],[3.780,20.531],[4.041,20.531],[4.302,20.271],[4.302,19.879],[4.171,19.749],[4.041,19.749],[3.911,19.619],[3.389,19.619],[3.911,19.619],[4.041,19.749],[4.432,19.749],[4.693,20.010],[4.823,20.010],[4.693,20.140],[4.432,20.140],[4.041,20.531],[3.911,20.531],[3.780,20.662],[3.389,20.662]], paths=[[0,1,2,3,4,5,6,7,8,9,10,11,12,13,14,15,16,17,18,19,20]]);
    polygon(points=[[2.998,26.006],[3.259,25.746],[3.259,25.354],[3.389,25.224],[3.520,25.224],[4.432,24.312],[4.432,24.181],[4.693,23.921],[4.823,23.529],[4.693,23.921],[4.823,24.051],[4.954,24.051],[4.823,24.181],[4.954,24.312],[4.954,24.442],[4.562,24.442],[4.432,24.312],[3.650,25.094],[3.780,25.224],[3.780,25.485],[3.911,25.615],[3.650,25.876],[3.520,25.876],[3.911,25.615],[3.389,25.224],[3.259,25.354],[3.259,25.746]], paths=[[0,1,2,3,4,5,6,7,8,9,10,11,12,13,14,15,16,17,18,19,20,21,22,23,24,25,26]]);
}
}
